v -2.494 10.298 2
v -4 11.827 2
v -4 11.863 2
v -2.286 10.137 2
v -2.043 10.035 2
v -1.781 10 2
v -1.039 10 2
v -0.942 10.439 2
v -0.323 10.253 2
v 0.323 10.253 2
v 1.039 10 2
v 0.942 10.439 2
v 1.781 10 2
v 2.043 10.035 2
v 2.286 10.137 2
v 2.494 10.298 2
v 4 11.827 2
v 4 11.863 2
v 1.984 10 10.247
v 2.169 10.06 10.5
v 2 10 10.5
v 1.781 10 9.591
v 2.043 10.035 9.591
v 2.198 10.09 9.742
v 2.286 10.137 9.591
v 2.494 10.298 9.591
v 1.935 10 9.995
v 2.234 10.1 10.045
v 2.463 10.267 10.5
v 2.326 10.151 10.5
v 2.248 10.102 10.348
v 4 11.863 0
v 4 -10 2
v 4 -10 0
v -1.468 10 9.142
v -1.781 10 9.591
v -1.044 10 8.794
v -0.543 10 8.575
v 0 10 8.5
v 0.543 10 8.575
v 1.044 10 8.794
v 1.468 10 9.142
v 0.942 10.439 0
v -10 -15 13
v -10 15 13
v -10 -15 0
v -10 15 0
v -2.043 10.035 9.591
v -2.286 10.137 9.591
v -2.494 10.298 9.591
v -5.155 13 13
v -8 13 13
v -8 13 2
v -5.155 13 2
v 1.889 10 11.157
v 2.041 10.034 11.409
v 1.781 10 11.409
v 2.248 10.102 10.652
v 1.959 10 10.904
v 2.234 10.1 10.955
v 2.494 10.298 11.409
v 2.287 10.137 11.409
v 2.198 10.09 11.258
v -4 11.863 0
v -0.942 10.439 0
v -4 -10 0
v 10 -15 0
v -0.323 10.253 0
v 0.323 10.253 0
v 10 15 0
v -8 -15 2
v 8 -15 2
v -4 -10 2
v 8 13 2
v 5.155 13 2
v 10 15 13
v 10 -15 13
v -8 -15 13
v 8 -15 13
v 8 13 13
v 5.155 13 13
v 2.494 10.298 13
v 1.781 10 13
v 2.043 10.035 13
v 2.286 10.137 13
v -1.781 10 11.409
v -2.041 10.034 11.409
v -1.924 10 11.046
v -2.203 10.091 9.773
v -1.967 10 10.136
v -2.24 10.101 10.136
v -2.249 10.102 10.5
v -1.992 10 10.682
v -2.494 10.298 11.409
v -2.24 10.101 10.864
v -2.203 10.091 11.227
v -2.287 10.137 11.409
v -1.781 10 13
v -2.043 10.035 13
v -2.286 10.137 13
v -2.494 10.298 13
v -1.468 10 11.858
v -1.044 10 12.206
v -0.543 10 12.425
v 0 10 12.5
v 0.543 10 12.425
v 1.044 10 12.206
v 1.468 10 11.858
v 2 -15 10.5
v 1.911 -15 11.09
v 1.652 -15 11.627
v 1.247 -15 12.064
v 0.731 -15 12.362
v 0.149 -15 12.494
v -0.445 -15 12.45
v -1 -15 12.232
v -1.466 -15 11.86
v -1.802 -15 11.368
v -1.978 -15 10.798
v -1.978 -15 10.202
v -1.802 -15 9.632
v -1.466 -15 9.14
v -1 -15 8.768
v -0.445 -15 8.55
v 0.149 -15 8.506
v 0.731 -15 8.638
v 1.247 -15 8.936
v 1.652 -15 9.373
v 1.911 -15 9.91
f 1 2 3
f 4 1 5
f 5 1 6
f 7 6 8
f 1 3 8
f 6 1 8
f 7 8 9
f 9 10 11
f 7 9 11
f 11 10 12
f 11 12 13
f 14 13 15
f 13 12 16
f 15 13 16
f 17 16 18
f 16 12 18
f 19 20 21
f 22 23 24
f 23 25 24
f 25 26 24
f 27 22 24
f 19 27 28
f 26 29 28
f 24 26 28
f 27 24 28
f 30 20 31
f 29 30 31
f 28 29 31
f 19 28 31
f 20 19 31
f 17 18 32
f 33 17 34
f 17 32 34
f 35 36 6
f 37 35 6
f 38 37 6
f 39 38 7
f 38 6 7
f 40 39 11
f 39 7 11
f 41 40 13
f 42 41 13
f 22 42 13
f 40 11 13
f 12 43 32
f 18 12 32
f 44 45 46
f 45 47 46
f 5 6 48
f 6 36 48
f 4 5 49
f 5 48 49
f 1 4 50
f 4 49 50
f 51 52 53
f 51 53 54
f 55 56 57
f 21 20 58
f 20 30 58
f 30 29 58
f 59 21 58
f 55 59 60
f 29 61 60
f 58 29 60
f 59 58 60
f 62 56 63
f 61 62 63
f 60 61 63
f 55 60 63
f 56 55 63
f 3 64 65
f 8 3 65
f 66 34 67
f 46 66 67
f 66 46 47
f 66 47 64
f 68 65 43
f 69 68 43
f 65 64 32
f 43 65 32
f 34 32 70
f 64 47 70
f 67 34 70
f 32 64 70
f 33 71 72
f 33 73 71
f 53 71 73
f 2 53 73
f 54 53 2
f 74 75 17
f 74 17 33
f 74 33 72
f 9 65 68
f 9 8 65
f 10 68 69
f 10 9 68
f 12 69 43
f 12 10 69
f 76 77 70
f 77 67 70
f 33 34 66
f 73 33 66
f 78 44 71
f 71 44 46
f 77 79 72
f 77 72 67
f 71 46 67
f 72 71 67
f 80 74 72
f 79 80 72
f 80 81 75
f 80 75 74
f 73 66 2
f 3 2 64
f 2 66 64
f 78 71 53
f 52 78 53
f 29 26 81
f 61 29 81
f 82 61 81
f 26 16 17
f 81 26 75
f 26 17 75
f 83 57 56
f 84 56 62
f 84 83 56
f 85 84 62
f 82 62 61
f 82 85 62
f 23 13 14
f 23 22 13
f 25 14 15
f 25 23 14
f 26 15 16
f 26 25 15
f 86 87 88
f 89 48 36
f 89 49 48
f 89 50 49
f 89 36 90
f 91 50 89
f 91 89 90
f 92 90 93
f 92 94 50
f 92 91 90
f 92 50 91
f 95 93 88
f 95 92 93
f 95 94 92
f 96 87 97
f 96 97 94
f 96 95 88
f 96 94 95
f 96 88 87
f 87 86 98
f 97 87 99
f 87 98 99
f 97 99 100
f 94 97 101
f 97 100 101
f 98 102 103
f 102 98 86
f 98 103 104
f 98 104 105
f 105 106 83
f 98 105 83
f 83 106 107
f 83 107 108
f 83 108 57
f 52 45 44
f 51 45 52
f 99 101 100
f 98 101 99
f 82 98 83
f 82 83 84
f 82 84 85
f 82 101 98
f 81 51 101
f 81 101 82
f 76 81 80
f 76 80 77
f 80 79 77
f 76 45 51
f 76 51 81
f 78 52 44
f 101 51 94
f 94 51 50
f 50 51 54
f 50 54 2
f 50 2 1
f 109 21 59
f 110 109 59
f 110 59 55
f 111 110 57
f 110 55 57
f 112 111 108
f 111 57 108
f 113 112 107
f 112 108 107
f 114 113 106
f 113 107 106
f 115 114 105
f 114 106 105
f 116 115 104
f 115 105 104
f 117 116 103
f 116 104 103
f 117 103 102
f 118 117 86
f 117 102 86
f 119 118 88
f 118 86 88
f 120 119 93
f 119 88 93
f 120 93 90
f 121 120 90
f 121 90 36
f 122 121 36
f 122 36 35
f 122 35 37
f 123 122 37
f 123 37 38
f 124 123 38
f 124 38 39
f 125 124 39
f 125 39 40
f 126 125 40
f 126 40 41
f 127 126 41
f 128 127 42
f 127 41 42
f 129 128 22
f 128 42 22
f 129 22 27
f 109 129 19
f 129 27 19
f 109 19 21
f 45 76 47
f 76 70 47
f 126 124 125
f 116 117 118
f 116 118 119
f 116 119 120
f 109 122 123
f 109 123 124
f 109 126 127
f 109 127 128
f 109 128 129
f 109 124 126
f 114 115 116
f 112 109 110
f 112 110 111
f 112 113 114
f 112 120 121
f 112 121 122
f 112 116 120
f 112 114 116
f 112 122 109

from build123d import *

# Parameters (mm, degrees)
F0_W     = 20
F0_H     = 30
F1_DEPTH = 2
F3_DEPTH = 11
F4_R     = 2
F5_DEPTH = 25
F6_R     = 1
F7_R     = 2.230975


with BuildPart() as f1:
    # F0 (on Top) → F1 (new body)
    with BuildSketch(Plane.XY):
        Rectangle(F0_W, F0_H)
        Polygon((-4, 11.862541), (0, 10), (4, 11.862541), (4, -10), (-4, -10), align=None, mode=Mode.SUBTRACT)
    extrude(amount=F1_DEPTH)

    # F2 (on face) → F3 (join)
    with BuildSketch(Plane.XY.offset(2)):
        Polygon((-2.2, 10), (0, 10), (2.2, 10), (5.155044, 13), (8, 13), (8, -15), (10, -15), (10, 15), (-10, 15), (-10, -15), (-8, -15), (-8, 13), (-5.155044, 13), align=None)
    extrude(amount=F3_DEPTH)

    # F4 (on face) → F5 (join)
    with BuildSketch(Plane.XZ.offset(-10)):
        with Locations((0, 10.5)):
            Circle(F4_R)
    extrude(amount=F5_DEPTH)

    # F6
    f6_edges = [f1.edges().sort_by_distance(p)[0] for p in [
        (2.2, 10, 7.5),
        (-2.2, 10, 7.5),
    ]]
    fillet(f6_edges, radius=F6_R)

    # F7
    f7_edges = [f1.edges().sort_by_distance(p)[0] for p in [
        (0, 10, 1),
    ]]
    fillet(f7_edges, radius=F7_R)


with BuildPart() as f8_1:
    # F8: copy of F1
    add(f1.part.moved(Location((43.7, 0, 0))))


solid = f1.part
